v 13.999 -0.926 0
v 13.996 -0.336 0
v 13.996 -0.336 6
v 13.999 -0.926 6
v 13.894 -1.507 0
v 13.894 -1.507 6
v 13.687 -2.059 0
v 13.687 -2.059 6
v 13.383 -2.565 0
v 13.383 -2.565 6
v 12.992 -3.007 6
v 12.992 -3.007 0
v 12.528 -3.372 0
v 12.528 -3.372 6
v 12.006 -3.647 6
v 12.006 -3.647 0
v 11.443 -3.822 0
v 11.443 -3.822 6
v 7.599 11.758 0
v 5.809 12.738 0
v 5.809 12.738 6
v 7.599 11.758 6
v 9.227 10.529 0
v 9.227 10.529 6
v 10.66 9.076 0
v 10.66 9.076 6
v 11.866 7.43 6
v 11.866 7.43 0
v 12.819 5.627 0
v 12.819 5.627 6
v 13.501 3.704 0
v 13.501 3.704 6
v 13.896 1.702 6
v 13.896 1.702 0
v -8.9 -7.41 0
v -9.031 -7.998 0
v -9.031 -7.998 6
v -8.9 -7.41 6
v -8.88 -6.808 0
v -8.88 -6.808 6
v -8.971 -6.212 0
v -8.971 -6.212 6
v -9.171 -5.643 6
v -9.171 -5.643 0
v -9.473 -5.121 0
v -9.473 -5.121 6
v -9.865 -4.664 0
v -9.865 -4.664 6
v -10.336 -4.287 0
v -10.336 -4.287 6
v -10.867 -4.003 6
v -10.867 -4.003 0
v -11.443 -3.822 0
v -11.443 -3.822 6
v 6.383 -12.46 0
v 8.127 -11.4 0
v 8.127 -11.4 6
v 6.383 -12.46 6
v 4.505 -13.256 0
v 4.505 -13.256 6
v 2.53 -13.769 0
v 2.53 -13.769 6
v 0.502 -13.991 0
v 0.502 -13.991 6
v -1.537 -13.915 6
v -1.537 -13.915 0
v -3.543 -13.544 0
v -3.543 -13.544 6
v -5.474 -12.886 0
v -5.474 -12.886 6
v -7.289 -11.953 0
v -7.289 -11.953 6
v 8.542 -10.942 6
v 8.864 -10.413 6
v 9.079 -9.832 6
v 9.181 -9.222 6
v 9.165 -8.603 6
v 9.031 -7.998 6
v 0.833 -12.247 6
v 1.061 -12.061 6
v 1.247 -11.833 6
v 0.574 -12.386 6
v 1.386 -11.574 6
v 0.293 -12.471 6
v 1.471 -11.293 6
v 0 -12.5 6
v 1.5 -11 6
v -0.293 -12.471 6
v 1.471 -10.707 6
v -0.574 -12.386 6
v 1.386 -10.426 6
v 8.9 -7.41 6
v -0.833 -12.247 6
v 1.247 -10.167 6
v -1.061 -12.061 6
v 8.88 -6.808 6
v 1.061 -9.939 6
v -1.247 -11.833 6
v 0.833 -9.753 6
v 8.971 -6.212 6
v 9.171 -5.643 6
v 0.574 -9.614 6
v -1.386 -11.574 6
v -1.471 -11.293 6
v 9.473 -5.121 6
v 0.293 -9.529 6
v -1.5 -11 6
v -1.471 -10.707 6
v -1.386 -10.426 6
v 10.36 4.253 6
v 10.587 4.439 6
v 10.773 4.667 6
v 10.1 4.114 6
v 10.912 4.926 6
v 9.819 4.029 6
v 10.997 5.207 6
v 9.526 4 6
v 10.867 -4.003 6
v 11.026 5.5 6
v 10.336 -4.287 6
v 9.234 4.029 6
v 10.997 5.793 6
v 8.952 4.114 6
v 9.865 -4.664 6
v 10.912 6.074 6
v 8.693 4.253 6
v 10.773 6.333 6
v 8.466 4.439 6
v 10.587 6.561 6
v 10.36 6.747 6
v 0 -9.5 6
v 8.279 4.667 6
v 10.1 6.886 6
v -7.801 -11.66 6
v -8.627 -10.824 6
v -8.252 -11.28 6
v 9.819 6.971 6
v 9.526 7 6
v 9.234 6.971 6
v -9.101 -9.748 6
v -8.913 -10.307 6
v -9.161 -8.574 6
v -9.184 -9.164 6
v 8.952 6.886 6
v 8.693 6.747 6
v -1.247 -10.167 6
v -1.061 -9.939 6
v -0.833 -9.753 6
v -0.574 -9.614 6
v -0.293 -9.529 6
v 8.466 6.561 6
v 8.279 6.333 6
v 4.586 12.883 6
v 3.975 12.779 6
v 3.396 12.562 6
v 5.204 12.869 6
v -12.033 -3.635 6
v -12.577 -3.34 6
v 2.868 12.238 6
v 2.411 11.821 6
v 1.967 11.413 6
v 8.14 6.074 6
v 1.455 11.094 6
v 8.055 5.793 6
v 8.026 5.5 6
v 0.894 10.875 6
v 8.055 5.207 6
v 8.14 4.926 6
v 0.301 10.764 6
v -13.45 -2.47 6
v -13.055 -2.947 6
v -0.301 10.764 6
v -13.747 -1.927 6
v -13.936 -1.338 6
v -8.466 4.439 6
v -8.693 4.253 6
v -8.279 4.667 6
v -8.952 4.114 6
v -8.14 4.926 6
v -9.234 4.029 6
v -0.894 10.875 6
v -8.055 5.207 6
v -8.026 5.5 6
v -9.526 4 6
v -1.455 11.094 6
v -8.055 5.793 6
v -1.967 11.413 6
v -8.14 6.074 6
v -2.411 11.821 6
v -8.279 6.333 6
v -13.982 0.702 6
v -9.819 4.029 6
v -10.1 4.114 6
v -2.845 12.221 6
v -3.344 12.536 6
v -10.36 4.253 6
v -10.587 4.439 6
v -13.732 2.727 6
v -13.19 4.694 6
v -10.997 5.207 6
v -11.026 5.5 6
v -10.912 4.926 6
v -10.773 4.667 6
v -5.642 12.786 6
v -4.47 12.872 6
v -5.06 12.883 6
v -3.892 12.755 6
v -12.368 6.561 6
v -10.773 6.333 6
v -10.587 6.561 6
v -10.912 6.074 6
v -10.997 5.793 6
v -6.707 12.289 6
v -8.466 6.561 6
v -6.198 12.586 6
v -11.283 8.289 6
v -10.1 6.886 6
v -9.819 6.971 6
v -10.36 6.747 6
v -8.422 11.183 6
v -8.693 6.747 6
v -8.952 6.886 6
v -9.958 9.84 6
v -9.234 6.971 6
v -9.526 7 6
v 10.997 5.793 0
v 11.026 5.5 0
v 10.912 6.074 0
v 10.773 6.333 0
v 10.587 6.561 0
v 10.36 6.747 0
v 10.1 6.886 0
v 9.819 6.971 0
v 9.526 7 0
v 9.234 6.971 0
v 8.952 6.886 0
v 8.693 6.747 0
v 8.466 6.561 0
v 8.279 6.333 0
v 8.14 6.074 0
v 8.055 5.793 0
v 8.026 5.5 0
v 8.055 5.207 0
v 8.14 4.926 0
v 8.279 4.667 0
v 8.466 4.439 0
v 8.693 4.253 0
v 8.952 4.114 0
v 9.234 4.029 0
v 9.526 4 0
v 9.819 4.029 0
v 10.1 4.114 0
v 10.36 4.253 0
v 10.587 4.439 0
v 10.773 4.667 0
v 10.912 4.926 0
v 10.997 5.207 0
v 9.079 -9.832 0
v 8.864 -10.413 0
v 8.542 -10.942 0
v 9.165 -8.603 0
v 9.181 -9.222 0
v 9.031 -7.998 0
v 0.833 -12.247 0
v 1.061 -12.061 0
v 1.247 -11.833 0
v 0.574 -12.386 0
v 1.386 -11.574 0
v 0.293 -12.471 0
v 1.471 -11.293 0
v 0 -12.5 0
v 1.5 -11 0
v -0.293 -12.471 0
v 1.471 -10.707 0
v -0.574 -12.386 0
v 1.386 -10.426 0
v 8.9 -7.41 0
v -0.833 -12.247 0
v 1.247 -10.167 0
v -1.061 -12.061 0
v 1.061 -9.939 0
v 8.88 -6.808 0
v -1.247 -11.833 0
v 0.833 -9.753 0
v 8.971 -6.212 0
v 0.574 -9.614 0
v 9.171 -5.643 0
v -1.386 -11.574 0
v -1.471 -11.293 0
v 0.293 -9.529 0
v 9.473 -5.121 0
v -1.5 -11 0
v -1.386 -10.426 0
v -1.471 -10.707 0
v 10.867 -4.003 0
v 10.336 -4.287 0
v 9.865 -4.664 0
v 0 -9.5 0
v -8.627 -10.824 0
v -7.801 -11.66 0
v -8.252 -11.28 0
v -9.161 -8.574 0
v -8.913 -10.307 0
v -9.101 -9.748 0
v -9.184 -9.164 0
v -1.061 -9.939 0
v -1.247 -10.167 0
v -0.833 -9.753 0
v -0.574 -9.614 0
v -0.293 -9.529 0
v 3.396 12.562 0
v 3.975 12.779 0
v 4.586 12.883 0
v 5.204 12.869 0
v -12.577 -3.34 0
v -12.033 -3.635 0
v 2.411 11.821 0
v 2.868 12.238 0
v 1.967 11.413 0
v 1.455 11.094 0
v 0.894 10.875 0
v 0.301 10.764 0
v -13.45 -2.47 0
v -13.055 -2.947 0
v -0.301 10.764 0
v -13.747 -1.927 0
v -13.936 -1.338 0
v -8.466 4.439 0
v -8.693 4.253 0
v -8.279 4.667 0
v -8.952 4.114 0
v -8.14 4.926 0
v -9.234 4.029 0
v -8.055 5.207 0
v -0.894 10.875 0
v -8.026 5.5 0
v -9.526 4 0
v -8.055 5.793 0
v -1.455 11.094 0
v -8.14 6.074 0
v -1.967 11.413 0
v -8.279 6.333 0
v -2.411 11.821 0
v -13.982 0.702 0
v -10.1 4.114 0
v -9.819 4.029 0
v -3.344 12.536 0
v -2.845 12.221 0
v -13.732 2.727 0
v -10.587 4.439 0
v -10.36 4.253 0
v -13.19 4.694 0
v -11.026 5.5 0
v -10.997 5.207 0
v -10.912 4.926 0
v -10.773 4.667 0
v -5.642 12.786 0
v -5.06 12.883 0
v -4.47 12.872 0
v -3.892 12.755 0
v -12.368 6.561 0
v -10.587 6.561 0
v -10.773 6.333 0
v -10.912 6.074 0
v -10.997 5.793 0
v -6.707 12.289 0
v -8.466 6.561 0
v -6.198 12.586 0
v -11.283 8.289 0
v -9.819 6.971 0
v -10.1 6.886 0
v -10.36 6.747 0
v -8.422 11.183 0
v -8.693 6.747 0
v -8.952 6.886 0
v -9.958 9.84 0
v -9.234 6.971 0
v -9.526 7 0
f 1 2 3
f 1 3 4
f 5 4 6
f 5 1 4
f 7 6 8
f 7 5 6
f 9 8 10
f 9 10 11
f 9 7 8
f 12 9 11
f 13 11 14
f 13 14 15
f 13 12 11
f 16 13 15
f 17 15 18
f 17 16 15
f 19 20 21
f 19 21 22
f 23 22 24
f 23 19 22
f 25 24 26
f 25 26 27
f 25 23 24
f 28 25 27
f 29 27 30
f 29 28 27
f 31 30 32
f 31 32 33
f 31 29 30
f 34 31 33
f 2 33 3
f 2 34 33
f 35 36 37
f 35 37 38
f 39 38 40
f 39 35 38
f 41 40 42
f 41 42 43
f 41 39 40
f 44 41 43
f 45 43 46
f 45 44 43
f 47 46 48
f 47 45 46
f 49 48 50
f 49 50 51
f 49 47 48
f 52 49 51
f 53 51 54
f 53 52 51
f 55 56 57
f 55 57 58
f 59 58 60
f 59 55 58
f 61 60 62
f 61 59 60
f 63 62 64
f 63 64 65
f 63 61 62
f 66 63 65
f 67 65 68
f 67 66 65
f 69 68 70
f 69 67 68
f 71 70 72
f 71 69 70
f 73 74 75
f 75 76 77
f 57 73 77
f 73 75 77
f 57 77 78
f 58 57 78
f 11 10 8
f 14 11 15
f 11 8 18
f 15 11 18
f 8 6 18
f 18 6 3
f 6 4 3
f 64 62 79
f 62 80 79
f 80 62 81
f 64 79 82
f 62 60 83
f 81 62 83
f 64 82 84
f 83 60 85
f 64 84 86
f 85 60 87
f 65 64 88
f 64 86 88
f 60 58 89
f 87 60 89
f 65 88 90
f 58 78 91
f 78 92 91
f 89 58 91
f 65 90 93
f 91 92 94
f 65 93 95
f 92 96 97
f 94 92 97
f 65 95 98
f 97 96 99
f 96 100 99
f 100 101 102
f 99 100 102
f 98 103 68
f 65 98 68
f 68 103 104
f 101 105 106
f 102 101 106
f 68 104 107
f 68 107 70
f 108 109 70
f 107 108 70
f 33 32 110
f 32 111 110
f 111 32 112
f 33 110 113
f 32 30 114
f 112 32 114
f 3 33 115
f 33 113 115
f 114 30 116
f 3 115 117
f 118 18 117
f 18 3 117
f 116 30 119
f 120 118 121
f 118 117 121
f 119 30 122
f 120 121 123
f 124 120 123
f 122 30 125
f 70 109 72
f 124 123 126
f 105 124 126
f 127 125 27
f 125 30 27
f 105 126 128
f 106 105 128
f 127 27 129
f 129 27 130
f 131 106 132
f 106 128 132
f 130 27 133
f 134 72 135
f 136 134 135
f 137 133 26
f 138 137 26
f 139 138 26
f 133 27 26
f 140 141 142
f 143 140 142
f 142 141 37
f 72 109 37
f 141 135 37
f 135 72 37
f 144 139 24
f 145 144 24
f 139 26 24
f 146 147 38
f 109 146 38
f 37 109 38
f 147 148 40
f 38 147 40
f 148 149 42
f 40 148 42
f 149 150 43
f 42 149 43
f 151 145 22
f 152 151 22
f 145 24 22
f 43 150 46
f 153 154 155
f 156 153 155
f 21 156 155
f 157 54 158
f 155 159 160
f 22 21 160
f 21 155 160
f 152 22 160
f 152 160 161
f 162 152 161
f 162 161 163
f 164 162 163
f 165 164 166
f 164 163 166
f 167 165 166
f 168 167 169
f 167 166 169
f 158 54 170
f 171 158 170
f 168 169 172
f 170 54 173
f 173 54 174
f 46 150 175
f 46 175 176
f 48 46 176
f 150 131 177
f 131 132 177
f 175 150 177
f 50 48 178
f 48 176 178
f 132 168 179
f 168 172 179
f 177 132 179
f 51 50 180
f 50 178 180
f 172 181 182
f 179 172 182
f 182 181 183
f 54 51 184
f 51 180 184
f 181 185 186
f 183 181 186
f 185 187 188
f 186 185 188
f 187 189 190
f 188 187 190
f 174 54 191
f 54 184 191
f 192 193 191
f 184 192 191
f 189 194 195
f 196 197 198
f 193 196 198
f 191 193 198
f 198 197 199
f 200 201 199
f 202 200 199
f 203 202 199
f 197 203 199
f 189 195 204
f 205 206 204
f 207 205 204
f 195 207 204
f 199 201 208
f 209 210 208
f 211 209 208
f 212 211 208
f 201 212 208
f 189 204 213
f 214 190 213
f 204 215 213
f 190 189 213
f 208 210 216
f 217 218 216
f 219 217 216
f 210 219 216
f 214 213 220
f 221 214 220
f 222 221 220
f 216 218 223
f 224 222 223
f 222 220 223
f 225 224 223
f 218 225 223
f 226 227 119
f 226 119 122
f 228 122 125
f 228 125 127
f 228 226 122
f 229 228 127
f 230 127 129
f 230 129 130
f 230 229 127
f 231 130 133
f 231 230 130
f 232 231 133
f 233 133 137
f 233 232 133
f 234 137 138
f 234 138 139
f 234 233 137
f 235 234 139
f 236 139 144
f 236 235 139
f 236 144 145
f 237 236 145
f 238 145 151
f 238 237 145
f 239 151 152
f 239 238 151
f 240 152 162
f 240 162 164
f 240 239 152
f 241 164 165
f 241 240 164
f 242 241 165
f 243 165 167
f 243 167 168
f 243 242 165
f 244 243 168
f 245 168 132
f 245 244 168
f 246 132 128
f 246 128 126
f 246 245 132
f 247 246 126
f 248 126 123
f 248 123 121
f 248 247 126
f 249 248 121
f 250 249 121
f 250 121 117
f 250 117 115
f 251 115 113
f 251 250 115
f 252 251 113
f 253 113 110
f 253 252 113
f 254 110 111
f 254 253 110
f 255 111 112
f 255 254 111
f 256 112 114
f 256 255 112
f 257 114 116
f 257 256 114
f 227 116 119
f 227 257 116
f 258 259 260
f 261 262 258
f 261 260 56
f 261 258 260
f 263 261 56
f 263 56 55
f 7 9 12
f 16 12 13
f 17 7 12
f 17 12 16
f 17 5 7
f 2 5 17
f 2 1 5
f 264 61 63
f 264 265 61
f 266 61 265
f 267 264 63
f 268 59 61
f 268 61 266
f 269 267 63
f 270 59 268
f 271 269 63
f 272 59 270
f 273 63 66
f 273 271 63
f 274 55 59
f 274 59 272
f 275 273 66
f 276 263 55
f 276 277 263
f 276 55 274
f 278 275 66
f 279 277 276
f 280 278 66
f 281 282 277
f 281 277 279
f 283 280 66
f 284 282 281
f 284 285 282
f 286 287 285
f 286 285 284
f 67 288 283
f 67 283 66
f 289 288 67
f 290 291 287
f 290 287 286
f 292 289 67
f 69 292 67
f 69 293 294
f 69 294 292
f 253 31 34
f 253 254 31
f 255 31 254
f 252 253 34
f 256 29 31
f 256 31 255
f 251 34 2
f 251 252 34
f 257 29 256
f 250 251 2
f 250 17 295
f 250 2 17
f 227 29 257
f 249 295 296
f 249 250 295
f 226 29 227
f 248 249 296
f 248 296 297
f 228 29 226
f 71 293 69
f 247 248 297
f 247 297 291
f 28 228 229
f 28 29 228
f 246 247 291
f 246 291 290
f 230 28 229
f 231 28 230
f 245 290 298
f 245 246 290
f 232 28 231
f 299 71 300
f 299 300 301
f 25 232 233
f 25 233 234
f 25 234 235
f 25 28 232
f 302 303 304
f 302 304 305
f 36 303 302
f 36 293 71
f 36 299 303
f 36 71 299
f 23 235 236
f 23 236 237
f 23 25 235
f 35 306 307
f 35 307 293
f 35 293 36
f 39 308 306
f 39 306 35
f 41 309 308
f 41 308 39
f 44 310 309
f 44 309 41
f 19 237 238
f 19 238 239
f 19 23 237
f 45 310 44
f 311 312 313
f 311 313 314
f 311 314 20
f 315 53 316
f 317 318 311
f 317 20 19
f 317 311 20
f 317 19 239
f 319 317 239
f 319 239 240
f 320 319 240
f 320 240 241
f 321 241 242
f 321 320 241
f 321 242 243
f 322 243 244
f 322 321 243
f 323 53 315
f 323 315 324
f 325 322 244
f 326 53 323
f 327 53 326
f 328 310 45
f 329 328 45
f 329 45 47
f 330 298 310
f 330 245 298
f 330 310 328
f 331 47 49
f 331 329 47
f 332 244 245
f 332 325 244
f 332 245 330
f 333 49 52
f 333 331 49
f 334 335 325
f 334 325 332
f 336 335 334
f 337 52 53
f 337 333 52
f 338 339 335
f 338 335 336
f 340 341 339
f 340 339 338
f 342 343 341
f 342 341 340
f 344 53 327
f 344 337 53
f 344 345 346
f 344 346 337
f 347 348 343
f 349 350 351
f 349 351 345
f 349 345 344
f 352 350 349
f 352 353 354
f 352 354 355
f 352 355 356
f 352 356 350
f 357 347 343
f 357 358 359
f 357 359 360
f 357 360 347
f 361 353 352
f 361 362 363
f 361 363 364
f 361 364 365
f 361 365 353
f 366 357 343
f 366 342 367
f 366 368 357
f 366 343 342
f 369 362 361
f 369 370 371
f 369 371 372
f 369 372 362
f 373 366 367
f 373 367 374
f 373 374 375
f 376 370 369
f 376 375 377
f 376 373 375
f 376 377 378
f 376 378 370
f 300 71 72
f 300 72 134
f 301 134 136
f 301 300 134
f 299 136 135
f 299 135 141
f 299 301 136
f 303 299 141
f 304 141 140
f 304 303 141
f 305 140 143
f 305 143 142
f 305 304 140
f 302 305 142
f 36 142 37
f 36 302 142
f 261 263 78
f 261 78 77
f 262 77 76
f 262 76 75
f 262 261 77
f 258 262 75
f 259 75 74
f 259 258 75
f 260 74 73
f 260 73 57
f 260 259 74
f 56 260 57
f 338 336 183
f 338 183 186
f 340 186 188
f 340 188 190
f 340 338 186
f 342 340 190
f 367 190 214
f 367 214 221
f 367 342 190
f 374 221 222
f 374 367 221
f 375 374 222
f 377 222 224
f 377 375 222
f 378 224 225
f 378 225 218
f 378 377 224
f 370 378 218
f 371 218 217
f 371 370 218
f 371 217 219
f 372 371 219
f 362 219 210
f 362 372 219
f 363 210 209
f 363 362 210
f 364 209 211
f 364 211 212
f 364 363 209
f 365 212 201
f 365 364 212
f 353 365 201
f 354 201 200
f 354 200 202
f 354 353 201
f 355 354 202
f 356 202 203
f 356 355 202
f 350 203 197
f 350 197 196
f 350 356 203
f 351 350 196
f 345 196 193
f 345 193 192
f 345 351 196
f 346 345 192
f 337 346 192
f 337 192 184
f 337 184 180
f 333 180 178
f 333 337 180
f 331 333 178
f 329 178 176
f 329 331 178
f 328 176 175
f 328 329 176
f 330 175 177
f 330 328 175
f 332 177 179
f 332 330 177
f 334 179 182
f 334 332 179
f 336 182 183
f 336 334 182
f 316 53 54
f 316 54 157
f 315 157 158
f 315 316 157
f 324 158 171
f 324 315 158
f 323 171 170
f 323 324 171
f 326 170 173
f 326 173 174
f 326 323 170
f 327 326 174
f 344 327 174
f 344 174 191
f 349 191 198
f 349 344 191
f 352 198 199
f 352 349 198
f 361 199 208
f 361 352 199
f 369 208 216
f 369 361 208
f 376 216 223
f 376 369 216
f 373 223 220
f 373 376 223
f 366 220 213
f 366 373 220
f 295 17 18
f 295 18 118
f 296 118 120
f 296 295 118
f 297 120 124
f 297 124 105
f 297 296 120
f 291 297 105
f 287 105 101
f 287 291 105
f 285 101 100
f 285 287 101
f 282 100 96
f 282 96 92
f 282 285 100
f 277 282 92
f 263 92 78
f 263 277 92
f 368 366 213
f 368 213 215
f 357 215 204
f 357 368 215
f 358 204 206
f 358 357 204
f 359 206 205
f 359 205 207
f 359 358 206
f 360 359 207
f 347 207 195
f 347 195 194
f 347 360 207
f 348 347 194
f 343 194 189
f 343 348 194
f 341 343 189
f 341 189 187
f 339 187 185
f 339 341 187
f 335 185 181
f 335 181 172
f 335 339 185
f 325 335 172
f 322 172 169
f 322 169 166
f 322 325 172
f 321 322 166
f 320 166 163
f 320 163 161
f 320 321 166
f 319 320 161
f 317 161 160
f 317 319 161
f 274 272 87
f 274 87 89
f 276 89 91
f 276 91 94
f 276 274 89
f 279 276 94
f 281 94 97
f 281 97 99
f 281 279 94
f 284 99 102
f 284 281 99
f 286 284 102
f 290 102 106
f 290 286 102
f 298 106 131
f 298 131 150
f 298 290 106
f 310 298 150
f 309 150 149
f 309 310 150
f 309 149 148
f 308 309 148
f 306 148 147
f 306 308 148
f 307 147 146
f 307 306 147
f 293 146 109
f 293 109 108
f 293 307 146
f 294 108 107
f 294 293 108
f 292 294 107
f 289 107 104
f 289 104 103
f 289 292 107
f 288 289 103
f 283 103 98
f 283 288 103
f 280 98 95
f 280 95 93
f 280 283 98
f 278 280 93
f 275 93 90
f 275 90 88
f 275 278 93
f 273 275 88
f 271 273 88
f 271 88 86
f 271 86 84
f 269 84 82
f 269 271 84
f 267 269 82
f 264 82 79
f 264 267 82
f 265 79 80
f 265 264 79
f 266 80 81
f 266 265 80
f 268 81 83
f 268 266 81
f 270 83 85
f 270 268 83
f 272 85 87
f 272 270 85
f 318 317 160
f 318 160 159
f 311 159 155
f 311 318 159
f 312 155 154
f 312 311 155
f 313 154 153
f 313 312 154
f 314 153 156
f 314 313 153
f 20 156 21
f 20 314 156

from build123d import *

# Parameters (mm, degrees)
ESQUISSE1_R        = 1.5
BOSS_EXTRU_2_DEPTH = 6


with BuildPart() as part:
    # Esquisse1 → Boss.-Extru.2 (new body)
    with BuildSketch(Plane.XY):
        with BuildLine():
            ThreePointArc((-2.411034891, 11.820685714), (0, 10.75), (2.411034891, 11.820685714))
            ThreePointArc((2.411034891, 11.820685714), (3.975330286, 12.779130538), (5.80943088, 12.737759334))
            ThreePointArc((5.80943088, 12.737759334), (11.865562564, 7.430237213), (13.995977593, -0.335575935))
            ThreePointArc((13.995977593, -0.335575935), (13.382779595, -2.564868949), (11.442531564, -3.822325392))
            ThreePointArc((11.442531564, -3.822325392), (9.309773091, -5.375), (9.031496673, -7.998360322))
            ThreePointArc((9.031496673, -7.998360322), (9.079386541, -9.832302285), (8.126507731, -11.399994391))
            ThreePointArc((8.126507731, -11.399994391), (0.5019929, -13.990997217), (-7.288606081, -11.953084179))
            ThreePointArc((-7.288606081, -11.953084179), (-8.912631465, -10.307392628), (-9.031496673, -7.998360322))
            ThreePointArc((-9.031496673, -7.998360322), (-9.309773091, -5.375), (-11.442531564, -3.822325392))
            ThreePointArc((-11.442531564, -3.822325392), (-13.054716827, -2.946828253), (-13.935938611, -1.337764944))
            ThreePointArc((-13.935938611, -1.337764944), (-12.367555464, 6.560760004), (-6.707371512, 12.288660114))
            ThreePointArc((-6.707371512, 12.288660114), (-4.47014813, 12.872261577), (-2.411034891, 11.820685714))
        make_face()
        with Locations((9.526279442, 5.5)):
            Circle(ESQUISSE1_R, mode=Mode.SUBTRACT)
        with Locations((0, -11)):
            Circle(ESQUISSE1_R, mode=Mode.SUBTRACT)
        with Locations((-9.526279442, 5.5)):
            Circle(ESQUISSE1_R, mode=Mode.SUBTRACT)
    extrude(amount=BOSS_EXTRU_2_DEPTH)


solid = part.part
